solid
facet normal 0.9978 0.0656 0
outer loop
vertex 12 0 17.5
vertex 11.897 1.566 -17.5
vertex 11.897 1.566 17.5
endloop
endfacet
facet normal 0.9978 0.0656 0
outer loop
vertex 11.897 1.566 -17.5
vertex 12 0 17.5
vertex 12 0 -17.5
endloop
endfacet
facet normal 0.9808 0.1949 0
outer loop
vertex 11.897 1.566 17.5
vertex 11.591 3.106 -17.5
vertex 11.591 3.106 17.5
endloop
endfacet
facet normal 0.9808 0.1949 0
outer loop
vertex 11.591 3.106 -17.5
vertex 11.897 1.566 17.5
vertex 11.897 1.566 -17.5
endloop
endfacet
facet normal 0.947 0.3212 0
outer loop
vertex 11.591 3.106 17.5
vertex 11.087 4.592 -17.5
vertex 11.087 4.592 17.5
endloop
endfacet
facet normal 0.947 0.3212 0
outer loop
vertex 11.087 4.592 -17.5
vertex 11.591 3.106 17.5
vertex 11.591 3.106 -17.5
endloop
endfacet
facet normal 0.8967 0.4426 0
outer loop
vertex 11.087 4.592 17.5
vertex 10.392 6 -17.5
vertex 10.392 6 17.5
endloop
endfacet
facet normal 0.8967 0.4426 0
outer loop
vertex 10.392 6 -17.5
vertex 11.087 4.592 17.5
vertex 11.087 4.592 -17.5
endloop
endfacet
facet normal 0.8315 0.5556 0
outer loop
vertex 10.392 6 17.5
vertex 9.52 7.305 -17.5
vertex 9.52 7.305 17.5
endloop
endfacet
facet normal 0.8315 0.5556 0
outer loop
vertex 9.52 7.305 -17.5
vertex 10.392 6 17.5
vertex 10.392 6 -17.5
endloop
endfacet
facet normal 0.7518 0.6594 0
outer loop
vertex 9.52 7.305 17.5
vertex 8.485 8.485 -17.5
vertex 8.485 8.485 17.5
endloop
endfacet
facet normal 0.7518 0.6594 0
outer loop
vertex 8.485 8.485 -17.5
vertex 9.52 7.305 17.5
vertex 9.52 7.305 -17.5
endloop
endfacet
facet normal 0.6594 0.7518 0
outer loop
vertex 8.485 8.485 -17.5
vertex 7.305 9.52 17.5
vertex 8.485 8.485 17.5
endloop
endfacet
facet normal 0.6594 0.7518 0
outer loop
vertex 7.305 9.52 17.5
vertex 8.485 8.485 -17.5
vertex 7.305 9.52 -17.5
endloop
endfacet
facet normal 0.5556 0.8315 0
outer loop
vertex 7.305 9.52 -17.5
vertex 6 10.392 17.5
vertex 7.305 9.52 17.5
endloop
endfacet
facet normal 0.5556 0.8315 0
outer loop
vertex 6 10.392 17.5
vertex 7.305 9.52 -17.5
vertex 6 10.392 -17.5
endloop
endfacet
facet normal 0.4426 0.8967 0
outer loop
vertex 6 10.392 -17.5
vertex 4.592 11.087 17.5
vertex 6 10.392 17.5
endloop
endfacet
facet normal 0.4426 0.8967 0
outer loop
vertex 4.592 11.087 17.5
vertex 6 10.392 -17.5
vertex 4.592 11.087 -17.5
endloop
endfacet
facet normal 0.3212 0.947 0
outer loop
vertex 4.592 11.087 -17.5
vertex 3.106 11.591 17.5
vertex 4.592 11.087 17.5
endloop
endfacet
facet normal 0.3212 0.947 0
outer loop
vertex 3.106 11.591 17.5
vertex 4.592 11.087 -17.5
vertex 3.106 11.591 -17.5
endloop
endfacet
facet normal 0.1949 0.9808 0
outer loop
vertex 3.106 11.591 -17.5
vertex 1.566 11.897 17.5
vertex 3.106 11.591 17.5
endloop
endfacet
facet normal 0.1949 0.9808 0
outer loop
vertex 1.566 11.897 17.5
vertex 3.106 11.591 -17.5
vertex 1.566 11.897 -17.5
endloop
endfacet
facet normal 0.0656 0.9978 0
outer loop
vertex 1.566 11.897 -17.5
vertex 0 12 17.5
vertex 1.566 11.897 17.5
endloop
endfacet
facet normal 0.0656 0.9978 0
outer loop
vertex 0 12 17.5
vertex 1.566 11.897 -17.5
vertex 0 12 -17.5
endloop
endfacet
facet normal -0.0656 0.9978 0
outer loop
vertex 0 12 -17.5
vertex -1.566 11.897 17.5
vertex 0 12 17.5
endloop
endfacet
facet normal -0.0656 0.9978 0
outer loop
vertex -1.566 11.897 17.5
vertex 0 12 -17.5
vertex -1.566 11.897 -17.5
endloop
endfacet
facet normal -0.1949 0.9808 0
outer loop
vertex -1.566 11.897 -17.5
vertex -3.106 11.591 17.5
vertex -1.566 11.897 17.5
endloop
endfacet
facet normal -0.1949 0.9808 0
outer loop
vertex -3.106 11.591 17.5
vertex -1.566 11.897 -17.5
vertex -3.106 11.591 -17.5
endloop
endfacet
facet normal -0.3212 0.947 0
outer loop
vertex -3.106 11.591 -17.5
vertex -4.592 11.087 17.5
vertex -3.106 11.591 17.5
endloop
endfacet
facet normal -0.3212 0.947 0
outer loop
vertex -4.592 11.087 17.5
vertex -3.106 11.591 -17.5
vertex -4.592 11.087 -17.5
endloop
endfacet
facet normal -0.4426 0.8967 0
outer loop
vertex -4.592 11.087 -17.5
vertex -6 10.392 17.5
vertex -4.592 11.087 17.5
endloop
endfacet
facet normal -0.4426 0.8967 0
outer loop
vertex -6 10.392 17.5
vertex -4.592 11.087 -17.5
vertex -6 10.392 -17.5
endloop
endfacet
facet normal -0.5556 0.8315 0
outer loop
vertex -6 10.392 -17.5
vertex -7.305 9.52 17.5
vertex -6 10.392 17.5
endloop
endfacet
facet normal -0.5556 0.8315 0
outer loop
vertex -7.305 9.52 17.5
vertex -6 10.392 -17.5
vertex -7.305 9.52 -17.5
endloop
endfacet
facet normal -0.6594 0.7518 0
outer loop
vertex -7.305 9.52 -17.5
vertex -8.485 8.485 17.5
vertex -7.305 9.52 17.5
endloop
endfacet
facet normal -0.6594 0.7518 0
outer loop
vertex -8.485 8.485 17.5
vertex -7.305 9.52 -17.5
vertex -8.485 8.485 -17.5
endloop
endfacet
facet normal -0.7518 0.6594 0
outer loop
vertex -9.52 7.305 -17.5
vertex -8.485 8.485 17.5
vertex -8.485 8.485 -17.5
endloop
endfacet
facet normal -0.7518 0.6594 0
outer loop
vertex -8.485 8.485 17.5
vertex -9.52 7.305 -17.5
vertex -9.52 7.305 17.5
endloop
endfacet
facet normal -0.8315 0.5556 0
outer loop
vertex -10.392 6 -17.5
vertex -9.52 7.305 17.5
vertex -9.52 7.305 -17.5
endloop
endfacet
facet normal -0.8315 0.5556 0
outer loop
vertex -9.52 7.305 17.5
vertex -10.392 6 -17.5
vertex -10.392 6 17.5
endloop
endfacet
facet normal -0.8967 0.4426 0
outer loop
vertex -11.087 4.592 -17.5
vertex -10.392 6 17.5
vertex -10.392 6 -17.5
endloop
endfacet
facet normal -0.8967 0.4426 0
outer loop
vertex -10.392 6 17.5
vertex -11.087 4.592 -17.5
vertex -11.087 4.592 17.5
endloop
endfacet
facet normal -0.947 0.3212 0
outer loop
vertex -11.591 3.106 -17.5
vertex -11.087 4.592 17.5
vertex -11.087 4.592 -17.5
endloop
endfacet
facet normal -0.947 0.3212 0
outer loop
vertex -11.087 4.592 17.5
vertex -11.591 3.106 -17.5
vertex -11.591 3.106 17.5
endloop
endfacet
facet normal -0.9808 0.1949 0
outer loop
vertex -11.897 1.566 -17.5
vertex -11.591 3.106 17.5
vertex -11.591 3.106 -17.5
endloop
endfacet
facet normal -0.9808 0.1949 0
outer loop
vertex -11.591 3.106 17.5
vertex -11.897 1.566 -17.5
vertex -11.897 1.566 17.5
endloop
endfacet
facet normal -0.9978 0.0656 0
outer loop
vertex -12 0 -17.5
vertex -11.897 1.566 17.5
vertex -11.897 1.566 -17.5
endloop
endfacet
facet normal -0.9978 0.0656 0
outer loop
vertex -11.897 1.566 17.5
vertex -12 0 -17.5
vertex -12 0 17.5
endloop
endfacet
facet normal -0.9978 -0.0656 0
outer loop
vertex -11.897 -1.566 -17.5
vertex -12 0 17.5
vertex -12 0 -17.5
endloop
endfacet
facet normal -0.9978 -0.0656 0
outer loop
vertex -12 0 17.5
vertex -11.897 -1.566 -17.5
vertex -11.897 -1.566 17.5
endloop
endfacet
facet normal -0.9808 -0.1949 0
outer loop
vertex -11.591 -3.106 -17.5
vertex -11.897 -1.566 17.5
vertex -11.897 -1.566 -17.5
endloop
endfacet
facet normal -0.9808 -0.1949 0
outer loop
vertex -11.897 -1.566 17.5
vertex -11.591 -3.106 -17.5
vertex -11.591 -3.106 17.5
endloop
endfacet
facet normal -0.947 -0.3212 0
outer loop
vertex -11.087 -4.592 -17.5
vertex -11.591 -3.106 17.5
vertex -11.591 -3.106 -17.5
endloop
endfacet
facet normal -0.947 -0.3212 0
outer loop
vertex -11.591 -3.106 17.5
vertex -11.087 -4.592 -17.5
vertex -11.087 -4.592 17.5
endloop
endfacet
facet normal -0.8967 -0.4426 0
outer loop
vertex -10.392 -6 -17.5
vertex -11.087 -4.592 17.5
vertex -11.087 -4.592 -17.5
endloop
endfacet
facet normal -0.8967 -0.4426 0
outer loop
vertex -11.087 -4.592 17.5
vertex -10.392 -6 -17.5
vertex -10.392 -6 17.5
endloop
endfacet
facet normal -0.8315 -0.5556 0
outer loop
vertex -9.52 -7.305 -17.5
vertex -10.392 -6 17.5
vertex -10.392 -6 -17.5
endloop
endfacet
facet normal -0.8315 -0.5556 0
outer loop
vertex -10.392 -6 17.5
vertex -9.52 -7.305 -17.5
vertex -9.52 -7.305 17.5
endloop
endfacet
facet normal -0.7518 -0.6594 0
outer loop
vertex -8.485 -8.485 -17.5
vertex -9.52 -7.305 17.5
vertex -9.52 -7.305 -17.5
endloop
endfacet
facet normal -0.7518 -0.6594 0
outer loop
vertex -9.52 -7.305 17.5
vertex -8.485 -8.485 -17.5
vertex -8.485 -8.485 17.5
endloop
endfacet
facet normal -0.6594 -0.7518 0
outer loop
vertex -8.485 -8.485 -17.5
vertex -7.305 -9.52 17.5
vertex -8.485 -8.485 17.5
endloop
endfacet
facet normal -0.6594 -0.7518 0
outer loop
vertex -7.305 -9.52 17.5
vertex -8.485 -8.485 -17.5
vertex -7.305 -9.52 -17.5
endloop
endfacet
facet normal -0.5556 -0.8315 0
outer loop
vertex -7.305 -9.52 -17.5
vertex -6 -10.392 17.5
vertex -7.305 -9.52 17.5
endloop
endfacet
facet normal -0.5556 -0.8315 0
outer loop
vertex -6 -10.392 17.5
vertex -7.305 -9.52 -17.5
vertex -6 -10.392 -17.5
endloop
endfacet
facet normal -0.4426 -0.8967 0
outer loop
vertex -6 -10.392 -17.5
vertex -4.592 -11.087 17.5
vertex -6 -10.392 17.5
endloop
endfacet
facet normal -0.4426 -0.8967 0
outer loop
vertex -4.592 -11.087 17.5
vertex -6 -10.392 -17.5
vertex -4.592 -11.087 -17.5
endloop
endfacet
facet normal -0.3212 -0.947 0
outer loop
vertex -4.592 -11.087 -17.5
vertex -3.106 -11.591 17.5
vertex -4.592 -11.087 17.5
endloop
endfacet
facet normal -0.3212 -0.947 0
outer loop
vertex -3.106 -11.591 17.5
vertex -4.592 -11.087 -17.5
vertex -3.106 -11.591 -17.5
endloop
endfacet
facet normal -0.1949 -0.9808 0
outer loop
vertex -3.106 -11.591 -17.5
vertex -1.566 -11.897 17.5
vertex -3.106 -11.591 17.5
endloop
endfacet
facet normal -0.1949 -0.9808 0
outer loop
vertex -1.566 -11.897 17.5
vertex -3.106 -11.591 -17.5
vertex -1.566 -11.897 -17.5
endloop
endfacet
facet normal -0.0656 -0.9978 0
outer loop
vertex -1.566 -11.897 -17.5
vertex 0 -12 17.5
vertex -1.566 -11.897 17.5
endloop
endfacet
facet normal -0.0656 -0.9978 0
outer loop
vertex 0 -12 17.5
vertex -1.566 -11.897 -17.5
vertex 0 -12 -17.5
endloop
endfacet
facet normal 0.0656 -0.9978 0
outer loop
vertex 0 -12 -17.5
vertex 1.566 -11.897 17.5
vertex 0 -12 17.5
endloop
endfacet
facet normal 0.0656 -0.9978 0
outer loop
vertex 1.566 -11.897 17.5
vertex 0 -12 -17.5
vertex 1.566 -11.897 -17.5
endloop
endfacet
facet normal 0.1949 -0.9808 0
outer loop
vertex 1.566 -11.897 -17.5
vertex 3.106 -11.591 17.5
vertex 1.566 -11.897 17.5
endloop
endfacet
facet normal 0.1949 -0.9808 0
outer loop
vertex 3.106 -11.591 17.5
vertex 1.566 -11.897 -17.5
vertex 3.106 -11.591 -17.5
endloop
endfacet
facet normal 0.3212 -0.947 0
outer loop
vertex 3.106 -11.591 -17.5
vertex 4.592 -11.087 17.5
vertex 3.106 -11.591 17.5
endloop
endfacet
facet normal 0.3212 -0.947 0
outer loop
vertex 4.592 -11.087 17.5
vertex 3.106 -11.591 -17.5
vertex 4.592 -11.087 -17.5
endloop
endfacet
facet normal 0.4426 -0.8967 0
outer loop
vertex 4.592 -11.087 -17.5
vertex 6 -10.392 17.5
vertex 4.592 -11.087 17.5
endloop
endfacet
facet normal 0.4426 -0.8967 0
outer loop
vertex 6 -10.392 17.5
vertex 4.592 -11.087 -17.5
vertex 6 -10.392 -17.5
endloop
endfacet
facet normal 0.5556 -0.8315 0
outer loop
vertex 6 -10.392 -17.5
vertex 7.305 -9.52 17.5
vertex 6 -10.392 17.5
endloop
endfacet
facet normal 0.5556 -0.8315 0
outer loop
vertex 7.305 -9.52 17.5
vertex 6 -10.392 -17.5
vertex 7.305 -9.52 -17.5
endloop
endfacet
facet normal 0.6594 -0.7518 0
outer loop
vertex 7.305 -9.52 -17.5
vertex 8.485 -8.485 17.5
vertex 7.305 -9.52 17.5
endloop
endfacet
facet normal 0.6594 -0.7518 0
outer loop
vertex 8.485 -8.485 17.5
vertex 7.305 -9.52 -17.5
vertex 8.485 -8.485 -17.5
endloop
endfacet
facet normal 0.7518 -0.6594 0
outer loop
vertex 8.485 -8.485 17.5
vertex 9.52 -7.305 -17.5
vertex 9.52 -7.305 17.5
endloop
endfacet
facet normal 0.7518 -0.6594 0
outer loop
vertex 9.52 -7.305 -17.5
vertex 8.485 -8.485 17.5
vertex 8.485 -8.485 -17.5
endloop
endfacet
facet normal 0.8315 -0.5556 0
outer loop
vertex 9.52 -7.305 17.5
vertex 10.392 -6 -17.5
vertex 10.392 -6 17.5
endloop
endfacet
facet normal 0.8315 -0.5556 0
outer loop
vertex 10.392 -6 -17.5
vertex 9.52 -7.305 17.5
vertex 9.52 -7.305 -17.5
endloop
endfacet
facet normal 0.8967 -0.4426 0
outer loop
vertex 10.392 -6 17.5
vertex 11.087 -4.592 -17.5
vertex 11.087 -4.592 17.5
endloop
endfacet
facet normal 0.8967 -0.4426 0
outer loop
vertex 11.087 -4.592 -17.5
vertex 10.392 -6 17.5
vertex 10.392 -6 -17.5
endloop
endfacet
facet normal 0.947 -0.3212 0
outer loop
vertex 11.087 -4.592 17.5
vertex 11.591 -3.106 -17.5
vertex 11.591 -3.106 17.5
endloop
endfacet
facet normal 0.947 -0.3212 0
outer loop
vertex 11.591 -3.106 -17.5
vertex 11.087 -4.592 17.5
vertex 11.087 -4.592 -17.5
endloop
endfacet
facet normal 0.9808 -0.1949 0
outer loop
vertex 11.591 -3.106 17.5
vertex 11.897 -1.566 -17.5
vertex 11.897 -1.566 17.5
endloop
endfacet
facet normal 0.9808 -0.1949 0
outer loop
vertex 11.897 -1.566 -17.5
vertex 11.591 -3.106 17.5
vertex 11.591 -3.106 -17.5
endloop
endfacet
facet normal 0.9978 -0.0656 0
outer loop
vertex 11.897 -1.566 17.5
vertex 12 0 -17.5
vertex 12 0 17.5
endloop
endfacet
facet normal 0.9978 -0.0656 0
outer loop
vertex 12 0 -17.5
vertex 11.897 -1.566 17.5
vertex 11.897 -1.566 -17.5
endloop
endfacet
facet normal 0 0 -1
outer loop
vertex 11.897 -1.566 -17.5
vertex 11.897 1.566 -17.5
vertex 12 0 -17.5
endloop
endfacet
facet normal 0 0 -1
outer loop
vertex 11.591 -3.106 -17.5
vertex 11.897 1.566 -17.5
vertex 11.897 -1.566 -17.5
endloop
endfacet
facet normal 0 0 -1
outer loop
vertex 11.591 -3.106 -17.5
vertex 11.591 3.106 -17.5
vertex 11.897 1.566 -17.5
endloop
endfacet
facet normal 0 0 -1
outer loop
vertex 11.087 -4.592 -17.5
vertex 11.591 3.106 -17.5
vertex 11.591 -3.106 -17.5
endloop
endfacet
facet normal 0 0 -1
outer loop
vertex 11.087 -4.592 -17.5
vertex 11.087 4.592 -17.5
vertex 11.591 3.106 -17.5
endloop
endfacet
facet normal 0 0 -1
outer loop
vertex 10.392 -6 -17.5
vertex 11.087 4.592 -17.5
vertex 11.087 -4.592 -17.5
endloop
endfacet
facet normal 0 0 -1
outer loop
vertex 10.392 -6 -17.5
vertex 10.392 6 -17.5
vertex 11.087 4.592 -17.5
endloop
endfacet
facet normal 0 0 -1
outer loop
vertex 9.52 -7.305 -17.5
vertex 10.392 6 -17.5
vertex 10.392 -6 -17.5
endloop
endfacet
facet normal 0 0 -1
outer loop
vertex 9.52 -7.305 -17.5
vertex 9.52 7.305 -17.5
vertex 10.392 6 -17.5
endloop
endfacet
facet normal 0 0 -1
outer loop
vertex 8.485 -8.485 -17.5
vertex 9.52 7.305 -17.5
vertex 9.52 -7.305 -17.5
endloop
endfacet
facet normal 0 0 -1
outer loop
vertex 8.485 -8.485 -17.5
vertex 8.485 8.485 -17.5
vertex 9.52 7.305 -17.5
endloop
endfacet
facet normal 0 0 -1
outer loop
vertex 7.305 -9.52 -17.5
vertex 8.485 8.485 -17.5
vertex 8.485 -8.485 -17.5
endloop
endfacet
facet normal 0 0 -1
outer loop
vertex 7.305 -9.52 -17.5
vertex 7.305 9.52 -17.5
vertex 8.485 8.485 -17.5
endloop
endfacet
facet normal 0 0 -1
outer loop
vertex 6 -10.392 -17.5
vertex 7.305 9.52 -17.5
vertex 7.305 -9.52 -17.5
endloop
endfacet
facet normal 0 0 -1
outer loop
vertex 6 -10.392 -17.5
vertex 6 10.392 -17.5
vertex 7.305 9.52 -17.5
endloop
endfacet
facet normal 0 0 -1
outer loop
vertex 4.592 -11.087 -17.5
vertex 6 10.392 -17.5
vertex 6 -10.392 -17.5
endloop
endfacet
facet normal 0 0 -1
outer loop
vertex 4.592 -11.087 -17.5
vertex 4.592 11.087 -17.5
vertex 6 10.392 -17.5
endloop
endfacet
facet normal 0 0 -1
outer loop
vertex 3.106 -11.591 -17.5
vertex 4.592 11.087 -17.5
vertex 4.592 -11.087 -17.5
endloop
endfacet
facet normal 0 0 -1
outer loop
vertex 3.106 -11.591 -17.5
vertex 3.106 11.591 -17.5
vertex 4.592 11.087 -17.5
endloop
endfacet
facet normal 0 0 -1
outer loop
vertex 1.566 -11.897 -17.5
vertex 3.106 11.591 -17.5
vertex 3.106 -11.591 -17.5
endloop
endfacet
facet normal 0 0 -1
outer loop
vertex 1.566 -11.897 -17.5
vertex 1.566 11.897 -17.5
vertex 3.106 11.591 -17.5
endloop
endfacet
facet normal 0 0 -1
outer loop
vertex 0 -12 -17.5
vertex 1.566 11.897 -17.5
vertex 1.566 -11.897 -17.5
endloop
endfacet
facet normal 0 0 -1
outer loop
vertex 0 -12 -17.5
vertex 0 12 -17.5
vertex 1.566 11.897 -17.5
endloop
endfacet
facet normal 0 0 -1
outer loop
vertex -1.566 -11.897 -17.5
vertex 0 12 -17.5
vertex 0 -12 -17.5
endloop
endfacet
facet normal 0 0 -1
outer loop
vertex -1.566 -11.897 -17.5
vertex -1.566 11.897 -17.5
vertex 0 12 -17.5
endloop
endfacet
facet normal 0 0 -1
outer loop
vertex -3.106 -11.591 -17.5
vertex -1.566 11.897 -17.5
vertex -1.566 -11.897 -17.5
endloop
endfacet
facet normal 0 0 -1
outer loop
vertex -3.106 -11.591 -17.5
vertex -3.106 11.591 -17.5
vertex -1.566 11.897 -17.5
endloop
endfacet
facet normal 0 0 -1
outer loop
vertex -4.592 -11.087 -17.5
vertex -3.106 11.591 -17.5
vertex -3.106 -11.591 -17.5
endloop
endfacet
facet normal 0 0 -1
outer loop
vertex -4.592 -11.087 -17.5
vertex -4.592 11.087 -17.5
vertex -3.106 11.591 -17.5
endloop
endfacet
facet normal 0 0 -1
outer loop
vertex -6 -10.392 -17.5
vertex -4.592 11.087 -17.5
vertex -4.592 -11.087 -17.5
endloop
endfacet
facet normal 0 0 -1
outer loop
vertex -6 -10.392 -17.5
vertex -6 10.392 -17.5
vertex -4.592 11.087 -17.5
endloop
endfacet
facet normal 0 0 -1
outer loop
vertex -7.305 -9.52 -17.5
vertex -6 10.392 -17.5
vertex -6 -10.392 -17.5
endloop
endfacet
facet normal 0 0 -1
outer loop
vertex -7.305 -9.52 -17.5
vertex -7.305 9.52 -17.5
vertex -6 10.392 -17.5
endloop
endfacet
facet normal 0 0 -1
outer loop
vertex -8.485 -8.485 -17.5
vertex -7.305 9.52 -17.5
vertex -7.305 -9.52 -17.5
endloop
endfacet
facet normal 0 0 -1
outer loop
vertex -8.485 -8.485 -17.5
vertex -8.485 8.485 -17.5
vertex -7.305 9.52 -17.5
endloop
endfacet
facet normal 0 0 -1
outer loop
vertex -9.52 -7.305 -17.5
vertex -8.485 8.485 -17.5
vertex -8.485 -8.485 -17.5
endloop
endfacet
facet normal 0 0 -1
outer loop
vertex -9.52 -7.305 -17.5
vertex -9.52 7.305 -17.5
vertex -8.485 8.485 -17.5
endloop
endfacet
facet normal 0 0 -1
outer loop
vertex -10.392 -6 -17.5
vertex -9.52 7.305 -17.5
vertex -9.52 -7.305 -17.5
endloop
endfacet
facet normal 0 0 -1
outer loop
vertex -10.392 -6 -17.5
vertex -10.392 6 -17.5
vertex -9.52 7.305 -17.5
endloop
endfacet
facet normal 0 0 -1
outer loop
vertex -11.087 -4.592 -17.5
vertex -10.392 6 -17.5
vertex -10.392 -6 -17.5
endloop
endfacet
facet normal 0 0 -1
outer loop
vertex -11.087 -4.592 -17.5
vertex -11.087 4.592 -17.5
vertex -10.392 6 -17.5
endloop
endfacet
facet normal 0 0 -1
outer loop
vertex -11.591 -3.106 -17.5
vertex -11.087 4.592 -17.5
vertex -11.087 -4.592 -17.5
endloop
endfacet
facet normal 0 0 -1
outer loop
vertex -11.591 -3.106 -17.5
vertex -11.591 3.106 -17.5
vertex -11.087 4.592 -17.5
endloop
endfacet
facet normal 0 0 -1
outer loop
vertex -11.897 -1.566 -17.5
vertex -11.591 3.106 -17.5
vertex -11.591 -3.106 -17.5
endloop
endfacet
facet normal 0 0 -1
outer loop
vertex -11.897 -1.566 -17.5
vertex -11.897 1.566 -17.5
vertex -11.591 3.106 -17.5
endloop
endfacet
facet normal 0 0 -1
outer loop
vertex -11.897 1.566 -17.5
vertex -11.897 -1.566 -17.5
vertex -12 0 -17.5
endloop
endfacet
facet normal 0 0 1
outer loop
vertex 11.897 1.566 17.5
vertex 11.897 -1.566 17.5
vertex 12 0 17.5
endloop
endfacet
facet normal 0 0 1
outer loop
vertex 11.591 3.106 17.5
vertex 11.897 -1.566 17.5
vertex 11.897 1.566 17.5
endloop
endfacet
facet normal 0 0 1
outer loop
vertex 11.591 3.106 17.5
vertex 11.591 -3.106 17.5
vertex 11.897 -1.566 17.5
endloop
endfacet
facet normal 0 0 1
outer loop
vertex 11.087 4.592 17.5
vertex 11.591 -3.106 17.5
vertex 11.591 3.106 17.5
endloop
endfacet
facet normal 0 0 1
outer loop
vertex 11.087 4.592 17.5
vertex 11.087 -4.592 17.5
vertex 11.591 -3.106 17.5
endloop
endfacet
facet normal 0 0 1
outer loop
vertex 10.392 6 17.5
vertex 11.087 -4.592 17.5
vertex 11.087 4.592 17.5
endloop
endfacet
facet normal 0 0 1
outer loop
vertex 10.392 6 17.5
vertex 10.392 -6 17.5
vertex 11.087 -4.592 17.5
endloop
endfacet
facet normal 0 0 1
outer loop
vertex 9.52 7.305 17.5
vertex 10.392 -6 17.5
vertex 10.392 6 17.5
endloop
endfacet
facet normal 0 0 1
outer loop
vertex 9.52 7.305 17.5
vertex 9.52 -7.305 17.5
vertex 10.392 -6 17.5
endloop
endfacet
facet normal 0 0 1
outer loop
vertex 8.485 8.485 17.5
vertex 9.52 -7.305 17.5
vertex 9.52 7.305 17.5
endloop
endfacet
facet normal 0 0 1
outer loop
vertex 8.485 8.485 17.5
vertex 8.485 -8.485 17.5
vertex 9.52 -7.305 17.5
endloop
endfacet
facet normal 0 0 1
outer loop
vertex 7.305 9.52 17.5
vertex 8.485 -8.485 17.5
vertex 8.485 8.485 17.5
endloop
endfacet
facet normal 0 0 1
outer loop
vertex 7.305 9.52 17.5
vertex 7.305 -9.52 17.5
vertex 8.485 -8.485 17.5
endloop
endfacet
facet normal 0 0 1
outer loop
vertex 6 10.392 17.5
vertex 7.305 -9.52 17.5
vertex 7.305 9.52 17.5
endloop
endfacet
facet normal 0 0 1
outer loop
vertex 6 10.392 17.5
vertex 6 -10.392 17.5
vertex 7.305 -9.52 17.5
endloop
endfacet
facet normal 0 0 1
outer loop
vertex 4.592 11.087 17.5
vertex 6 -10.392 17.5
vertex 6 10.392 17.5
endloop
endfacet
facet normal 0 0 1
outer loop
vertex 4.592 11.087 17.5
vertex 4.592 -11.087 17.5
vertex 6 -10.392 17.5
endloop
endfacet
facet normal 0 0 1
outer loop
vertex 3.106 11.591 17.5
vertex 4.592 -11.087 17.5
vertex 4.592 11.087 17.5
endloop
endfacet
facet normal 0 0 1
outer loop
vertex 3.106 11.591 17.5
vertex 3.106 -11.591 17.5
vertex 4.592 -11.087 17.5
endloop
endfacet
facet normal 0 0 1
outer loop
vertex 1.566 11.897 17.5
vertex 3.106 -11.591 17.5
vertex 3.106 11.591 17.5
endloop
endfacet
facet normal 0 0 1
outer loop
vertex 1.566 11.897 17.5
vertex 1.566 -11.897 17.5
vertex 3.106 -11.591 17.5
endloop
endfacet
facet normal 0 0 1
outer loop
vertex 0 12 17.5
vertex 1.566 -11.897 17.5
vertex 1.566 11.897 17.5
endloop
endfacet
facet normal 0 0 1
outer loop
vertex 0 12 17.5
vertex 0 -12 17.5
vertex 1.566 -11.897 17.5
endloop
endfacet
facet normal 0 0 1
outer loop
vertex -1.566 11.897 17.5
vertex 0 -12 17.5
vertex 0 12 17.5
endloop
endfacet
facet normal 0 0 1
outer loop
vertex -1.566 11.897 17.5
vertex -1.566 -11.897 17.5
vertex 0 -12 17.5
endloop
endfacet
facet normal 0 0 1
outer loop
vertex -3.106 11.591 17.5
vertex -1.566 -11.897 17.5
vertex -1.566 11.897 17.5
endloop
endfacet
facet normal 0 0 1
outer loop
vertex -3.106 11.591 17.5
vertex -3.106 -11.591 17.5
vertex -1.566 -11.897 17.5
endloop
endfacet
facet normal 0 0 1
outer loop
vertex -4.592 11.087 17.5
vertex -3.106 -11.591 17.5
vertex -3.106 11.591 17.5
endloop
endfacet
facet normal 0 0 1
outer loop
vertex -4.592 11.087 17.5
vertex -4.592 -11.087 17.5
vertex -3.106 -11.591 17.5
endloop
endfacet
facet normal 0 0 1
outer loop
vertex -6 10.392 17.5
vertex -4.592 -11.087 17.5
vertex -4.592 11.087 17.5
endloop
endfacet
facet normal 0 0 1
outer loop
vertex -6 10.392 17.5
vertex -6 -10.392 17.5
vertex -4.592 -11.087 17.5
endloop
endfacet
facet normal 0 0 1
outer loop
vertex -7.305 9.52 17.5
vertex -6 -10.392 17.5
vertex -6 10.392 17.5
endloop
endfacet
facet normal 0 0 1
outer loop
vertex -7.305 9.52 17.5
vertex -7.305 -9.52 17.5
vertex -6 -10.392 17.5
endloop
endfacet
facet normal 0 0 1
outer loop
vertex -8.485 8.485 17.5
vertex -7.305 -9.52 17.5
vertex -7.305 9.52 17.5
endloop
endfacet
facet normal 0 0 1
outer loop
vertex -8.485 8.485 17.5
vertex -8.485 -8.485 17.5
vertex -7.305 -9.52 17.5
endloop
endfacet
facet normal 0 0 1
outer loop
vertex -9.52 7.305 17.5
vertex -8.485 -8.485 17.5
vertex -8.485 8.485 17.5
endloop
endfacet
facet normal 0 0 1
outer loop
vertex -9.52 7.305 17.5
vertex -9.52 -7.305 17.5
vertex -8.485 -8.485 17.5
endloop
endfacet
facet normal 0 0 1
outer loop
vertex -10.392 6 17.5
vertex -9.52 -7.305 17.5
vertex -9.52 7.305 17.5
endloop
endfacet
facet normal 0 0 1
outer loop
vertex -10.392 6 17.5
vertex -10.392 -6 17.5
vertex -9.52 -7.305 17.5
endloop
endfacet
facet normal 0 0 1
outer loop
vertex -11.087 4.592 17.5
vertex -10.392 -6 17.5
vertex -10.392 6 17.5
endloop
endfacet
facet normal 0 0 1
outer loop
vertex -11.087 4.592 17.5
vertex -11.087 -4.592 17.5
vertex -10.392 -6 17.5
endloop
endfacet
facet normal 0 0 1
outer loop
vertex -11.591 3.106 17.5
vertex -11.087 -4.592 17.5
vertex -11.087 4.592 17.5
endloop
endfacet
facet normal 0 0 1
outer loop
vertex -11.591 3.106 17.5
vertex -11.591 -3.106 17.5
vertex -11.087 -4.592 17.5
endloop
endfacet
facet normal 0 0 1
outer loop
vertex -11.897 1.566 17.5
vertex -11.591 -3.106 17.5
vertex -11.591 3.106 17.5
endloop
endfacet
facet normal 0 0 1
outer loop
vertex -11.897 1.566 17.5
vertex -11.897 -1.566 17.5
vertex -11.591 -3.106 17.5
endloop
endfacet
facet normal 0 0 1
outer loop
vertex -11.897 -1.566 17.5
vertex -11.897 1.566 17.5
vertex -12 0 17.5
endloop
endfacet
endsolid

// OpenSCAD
// ========================================
// a cylinder with radius 1.2 cm and height 3.5 cm
// NeuroCAD canonical IR; dimensions are millimetres
// ========================================
$fn = 48;

cylinder(r=12, h=35, center=true);
